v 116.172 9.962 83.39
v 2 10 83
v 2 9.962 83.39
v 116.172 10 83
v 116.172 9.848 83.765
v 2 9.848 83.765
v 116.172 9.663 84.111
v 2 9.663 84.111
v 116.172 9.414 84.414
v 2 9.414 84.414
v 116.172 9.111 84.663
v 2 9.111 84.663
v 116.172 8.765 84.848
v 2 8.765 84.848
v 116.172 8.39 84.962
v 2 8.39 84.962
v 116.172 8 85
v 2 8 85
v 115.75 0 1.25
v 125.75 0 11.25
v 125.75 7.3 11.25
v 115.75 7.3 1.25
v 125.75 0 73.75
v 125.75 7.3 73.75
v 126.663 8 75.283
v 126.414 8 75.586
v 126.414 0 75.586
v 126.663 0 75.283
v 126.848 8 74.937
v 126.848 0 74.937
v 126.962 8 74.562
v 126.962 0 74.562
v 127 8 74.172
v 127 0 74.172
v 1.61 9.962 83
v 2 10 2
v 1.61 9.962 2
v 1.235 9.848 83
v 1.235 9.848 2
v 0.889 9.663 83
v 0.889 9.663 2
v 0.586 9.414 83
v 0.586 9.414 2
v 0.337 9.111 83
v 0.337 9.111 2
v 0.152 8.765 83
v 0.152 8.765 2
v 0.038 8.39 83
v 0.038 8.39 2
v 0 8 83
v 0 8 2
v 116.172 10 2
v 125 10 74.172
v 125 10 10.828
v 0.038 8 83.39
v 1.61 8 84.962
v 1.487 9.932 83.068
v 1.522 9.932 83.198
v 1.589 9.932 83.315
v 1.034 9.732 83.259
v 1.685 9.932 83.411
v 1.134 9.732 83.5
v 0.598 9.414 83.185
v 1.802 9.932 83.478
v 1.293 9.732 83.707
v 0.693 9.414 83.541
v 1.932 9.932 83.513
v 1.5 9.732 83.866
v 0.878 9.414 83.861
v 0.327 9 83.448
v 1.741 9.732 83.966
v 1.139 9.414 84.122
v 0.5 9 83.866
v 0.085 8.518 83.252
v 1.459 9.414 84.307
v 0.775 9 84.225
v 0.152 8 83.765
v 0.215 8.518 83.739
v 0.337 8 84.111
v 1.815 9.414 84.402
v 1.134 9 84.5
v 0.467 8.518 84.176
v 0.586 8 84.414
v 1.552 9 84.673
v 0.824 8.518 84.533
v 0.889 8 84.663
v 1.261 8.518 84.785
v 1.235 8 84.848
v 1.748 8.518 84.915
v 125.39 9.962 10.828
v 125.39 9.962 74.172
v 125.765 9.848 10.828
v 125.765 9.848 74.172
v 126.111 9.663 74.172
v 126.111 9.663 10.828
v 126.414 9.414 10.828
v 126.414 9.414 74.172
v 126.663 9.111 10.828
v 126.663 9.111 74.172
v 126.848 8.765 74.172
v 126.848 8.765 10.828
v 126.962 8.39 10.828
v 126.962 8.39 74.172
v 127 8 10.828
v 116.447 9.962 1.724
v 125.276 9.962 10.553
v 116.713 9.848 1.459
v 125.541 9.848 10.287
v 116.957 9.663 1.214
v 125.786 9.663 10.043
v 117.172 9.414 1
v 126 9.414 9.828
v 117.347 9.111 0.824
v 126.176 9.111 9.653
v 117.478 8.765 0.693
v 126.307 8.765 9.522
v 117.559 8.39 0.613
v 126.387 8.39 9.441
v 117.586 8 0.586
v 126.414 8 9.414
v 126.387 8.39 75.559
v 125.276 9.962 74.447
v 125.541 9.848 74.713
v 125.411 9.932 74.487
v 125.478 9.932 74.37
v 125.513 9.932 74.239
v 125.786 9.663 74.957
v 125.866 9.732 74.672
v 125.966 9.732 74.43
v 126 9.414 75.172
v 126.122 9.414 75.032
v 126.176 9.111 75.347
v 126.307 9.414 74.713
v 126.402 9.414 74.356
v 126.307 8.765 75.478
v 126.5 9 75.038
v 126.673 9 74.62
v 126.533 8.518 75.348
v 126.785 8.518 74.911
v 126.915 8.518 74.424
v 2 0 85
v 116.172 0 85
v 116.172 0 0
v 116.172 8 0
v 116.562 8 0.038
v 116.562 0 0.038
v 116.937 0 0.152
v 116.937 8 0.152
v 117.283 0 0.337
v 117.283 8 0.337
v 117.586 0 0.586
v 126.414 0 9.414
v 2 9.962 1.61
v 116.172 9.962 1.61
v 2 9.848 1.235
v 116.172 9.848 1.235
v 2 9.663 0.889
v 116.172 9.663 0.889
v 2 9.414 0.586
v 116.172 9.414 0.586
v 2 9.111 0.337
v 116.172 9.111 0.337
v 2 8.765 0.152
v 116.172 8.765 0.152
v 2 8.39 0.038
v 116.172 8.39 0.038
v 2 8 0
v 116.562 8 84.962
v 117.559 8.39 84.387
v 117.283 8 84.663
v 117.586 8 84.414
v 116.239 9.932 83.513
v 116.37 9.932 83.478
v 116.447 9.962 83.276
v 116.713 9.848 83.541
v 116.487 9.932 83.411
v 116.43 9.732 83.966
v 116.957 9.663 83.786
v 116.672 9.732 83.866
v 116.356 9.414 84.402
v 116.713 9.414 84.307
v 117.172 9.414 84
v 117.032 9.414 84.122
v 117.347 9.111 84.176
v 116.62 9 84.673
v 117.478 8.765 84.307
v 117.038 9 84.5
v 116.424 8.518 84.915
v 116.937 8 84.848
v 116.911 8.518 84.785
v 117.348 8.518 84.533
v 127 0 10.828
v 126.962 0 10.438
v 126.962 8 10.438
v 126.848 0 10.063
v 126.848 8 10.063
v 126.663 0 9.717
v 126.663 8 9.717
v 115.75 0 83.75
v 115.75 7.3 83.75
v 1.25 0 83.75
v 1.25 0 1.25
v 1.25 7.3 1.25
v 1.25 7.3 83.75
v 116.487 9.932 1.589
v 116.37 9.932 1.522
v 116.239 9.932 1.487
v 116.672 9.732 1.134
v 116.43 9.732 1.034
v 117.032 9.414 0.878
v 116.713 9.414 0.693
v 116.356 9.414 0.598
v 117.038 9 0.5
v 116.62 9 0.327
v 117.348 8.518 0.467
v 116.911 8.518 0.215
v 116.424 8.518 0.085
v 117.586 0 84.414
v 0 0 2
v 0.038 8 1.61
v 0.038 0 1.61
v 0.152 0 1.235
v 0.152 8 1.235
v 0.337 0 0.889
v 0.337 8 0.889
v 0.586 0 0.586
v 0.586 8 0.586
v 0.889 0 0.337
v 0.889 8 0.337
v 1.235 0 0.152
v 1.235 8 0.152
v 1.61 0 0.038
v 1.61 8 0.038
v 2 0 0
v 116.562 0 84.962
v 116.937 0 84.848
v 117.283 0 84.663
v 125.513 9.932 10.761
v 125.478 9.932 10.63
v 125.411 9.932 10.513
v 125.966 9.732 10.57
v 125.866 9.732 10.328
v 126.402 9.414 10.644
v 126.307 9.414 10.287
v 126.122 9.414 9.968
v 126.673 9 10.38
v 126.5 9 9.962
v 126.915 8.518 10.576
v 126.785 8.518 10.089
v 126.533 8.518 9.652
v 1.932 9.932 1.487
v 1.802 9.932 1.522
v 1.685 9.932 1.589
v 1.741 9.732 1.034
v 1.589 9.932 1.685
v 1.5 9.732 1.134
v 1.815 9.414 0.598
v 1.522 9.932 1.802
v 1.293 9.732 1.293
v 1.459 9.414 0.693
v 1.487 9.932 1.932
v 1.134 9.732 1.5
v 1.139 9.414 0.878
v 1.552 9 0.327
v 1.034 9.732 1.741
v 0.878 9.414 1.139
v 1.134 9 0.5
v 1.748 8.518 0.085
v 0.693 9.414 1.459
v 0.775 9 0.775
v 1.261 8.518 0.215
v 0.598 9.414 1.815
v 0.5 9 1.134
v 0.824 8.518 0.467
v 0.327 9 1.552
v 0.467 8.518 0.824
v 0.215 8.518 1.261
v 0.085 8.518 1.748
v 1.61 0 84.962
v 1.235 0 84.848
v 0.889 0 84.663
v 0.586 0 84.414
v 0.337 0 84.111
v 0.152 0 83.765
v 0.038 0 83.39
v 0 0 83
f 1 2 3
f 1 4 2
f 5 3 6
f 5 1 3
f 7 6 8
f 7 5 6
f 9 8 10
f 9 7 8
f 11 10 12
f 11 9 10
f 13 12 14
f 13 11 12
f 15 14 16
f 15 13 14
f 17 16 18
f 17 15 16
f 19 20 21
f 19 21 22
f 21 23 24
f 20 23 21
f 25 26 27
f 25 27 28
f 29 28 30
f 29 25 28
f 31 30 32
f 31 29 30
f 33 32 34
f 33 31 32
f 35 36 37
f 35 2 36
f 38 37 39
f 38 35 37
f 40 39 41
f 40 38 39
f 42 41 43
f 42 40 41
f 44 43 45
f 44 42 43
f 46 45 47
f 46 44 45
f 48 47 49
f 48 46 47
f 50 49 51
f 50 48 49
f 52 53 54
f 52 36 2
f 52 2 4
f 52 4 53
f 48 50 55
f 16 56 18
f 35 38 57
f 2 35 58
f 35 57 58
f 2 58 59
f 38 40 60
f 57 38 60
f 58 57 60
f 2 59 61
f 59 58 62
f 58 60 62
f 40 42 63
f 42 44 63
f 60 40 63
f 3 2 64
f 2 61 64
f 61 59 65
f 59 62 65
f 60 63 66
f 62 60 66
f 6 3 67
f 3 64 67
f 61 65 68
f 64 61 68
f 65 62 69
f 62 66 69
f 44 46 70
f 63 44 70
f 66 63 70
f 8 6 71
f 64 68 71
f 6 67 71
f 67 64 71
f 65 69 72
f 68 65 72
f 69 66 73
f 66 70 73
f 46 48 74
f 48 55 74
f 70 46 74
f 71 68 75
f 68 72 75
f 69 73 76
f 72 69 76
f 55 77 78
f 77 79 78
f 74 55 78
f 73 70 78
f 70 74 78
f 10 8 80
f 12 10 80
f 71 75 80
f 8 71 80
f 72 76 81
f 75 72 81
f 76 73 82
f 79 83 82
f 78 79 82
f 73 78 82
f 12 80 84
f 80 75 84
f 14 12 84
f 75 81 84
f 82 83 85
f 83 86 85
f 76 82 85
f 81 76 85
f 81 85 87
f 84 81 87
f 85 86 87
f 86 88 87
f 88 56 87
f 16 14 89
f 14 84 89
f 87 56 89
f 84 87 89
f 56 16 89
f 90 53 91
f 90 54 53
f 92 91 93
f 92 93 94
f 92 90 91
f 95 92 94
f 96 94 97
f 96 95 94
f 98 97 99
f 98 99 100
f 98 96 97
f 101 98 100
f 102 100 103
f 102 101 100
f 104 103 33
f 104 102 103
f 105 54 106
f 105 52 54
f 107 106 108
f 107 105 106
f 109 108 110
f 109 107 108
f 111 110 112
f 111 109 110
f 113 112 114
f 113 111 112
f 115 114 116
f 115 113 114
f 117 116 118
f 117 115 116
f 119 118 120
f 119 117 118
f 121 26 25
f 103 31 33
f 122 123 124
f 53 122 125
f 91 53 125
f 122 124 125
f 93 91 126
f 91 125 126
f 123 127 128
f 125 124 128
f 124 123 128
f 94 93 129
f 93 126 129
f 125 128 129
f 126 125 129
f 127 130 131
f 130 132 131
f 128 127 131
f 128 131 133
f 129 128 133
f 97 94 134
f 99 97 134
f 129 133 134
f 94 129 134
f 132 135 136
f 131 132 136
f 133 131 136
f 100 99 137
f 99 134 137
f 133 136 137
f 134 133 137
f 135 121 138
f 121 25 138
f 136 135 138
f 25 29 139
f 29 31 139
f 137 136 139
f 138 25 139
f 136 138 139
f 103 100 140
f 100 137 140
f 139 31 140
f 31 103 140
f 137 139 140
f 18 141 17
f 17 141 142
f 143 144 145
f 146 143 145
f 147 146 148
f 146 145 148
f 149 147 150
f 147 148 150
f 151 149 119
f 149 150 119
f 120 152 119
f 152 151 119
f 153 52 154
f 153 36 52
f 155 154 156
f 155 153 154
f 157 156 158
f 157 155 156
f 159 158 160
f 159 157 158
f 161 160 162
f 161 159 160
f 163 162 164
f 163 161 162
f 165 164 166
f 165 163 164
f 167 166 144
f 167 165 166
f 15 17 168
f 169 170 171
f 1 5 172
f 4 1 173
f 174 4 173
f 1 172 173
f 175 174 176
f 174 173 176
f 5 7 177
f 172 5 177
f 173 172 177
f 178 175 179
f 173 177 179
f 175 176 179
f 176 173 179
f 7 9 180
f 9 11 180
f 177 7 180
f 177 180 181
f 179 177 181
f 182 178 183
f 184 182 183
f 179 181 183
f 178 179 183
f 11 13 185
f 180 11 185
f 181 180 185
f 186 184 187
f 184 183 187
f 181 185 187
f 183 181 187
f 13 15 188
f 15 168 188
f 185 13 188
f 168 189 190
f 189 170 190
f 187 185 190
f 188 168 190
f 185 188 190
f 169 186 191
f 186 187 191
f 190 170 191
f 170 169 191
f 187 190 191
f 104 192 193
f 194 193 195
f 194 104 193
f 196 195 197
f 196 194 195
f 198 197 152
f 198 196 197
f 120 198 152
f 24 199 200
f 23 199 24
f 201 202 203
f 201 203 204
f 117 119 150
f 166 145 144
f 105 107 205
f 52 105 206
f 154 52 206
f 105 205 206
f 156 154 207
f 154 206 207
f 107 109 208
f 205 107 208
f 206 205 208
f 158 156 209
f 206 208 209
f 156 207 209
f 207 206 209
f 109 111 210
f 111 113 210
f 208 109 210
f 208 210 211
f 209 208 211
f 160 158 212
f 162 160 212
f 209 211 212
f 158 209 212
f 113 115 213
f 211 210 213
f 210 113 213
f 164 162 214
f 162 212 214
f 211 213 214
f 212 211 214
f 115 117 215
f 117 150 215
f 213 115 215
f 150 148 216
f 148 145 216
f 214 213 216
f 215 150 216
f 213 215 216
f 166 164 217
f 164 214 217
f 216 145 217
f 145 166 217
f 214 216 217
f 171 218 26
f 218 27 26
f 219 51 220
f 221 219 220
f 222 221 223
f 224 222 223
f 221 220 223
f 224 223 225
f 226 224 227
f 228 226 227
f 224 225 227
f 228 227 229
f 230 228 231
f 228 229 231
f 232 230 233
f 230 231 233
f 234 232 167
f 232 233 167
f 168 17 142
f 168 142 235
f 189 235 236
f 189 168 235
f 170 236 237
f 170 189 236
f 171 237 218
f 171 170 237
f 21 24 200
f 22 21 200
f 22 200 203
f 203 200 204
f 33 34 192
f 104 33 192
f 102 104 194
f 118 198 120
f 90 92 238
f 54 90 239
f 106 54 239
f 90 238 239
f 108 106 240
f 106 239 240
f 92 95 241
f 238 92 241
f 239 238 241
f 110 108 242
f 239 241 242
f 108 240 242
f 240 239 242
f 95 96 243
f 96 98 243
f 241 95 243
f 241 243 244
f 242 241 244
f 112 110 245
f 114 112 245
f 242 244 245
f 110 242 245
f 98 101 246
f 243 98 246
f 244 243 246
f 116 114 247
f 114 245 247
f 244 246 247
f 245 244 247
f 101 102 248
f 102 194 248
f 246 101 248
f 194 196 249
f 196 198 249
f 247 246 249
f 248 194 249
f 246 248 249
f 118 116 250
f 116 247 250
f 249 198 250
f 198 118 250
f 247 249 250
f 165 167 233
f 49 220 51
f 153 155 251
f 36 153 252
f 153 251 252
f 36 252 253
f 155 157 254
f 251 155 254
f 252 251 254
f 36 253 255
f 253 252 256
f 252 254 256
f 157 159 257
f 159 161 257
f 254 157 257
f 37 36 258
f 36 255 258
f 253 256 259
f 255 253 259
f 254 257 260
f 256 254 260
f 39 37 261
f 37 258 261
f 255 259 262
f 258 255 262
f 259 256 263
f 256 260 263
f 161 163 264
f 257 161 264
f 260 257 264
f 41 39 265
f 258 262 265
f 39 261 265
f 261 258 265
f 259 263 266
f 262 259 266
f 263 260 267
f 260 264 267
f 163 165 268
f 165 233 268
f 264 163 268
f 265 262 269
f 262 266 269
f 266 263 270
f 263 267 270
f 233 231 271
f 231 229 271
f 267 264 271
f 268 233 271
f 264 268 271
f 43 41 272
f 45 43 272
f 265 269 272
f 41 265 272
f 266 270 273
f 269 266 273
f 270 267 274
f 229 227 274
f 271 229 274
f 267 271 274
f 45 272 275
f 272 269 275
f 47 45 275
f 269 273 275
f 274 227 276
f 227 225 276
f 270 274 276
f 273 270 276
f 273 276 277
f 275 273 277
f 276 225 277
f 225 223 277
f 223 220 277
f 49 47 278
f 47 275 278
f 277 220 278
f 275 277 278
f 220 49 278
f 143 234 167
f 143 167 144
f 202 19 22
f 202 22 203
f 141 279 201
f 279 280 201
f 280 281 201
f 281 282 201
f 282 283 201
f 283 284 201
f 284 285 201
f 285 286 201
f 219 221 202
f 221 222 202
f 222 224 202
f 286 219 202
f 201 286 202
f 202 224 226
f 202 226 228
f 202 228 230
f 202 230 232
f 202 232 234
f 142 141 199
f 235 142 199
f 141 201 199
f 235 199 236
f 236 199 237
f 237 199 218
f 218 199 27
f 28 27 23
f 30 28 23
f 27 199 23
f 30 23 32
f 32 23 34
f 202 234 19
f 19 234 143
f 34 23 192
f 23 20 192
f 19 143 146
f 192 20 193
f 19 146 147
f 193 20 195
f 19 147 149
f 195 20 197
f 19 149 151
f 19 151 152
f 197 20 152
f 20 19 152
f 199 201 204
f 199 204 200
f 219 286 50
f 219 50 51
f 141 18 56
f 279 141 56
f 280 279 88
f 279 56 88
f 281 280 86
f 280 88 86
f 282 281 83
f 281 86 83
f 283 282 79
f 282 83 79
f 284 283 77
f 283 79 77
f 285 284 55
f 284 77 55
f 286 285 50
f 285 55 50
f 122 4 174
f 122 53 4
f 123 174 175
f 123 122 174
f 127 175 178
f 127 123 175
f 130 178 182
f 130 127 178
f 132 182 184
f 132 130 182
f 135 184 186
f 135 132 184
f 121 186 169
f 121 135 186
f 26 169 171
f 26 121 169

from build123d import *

# Parameters (mm, degrees)
SKETCH1_W           = 127
SKETCH1_H           = 85
BOSS_EXTRUDE1_DEPTH = 10
CHAMFER1_SIZE       = 10
FILLET1_R           = 2
FILLET2_R           = 2
CUT_EXTRUDE1_DEPTH  = 7.3


with BuildPart() as part:
    # Sketch1 → Boss-Extrude1 (new body)
    with BuildSketch(Plane(origin=(0, 0, 0), x_dir=(1, 0, 0), z_dir=(0, 1, 0))):
        with Locations((63.5, -42.5)):
            Rectangle(SKETCH1_W, SKETCH1_H)
    extrude(amount=BOSS_EXTRUDE1_DEPTH)

    # Chamfer1
    chamfer1_edges = [part.edges().sort_by_distance(p)[0] for p in [
        (127, 5, 0),
        (127, 5, 85),
    ]]
    chamfer(chamfer1_edges, length=CHAMFER1_SIZE)

    # Fillet1
    fillet1_edges = [part.edges().sort_by_distance(p)[0] for p in [
        (127, 5, 10),
        (127, 5, 75),
        (117, 5, 85),
        (117, 5, 0),
        (0, 5, 0),
        (0, 5, 85),
    ]]
    fillet(fillet1_edges, radius=FILLET1_R)

    # Fillet2
    fillet2_edges = [part.edges().sort_by_distance(p)[0] for p in [
        (127, 10, 42.5),
        (122, 10, 80),
        (59.085786438, 10, 85),
        (122, 10, 5),
        (59.085786438, 10, 0),
        (0, 10, 42.5),
        (126.847759065, 10, 10.06306026),
        (116.93693974, 10, 0.152240935),
        (0.585786438, 10, 0.585786438),
        (0.585786438, 10, 84.414213562),
        (116.93693974, 10, 84.847759065),
        (126.847759065, 10, 74.93693974),
    ]]
    fillet(fillet2_edges, radius=FILLET2_R)

    # Sketch2 → Cut-Extrude1 (cut)
    with BuildSketch(Plane.XZ):
        Polygon((1.25, 83.75), (115.75, 83.75), (125.75, 73.75), (125.75, 11.25), (115.75, 1.25), (1.25, 1.25), align=None)
    extrude(amount=-CUT_EXTRUDE1_DEPTH, mode=Mode.SUBTRACT)


solid = part.part
